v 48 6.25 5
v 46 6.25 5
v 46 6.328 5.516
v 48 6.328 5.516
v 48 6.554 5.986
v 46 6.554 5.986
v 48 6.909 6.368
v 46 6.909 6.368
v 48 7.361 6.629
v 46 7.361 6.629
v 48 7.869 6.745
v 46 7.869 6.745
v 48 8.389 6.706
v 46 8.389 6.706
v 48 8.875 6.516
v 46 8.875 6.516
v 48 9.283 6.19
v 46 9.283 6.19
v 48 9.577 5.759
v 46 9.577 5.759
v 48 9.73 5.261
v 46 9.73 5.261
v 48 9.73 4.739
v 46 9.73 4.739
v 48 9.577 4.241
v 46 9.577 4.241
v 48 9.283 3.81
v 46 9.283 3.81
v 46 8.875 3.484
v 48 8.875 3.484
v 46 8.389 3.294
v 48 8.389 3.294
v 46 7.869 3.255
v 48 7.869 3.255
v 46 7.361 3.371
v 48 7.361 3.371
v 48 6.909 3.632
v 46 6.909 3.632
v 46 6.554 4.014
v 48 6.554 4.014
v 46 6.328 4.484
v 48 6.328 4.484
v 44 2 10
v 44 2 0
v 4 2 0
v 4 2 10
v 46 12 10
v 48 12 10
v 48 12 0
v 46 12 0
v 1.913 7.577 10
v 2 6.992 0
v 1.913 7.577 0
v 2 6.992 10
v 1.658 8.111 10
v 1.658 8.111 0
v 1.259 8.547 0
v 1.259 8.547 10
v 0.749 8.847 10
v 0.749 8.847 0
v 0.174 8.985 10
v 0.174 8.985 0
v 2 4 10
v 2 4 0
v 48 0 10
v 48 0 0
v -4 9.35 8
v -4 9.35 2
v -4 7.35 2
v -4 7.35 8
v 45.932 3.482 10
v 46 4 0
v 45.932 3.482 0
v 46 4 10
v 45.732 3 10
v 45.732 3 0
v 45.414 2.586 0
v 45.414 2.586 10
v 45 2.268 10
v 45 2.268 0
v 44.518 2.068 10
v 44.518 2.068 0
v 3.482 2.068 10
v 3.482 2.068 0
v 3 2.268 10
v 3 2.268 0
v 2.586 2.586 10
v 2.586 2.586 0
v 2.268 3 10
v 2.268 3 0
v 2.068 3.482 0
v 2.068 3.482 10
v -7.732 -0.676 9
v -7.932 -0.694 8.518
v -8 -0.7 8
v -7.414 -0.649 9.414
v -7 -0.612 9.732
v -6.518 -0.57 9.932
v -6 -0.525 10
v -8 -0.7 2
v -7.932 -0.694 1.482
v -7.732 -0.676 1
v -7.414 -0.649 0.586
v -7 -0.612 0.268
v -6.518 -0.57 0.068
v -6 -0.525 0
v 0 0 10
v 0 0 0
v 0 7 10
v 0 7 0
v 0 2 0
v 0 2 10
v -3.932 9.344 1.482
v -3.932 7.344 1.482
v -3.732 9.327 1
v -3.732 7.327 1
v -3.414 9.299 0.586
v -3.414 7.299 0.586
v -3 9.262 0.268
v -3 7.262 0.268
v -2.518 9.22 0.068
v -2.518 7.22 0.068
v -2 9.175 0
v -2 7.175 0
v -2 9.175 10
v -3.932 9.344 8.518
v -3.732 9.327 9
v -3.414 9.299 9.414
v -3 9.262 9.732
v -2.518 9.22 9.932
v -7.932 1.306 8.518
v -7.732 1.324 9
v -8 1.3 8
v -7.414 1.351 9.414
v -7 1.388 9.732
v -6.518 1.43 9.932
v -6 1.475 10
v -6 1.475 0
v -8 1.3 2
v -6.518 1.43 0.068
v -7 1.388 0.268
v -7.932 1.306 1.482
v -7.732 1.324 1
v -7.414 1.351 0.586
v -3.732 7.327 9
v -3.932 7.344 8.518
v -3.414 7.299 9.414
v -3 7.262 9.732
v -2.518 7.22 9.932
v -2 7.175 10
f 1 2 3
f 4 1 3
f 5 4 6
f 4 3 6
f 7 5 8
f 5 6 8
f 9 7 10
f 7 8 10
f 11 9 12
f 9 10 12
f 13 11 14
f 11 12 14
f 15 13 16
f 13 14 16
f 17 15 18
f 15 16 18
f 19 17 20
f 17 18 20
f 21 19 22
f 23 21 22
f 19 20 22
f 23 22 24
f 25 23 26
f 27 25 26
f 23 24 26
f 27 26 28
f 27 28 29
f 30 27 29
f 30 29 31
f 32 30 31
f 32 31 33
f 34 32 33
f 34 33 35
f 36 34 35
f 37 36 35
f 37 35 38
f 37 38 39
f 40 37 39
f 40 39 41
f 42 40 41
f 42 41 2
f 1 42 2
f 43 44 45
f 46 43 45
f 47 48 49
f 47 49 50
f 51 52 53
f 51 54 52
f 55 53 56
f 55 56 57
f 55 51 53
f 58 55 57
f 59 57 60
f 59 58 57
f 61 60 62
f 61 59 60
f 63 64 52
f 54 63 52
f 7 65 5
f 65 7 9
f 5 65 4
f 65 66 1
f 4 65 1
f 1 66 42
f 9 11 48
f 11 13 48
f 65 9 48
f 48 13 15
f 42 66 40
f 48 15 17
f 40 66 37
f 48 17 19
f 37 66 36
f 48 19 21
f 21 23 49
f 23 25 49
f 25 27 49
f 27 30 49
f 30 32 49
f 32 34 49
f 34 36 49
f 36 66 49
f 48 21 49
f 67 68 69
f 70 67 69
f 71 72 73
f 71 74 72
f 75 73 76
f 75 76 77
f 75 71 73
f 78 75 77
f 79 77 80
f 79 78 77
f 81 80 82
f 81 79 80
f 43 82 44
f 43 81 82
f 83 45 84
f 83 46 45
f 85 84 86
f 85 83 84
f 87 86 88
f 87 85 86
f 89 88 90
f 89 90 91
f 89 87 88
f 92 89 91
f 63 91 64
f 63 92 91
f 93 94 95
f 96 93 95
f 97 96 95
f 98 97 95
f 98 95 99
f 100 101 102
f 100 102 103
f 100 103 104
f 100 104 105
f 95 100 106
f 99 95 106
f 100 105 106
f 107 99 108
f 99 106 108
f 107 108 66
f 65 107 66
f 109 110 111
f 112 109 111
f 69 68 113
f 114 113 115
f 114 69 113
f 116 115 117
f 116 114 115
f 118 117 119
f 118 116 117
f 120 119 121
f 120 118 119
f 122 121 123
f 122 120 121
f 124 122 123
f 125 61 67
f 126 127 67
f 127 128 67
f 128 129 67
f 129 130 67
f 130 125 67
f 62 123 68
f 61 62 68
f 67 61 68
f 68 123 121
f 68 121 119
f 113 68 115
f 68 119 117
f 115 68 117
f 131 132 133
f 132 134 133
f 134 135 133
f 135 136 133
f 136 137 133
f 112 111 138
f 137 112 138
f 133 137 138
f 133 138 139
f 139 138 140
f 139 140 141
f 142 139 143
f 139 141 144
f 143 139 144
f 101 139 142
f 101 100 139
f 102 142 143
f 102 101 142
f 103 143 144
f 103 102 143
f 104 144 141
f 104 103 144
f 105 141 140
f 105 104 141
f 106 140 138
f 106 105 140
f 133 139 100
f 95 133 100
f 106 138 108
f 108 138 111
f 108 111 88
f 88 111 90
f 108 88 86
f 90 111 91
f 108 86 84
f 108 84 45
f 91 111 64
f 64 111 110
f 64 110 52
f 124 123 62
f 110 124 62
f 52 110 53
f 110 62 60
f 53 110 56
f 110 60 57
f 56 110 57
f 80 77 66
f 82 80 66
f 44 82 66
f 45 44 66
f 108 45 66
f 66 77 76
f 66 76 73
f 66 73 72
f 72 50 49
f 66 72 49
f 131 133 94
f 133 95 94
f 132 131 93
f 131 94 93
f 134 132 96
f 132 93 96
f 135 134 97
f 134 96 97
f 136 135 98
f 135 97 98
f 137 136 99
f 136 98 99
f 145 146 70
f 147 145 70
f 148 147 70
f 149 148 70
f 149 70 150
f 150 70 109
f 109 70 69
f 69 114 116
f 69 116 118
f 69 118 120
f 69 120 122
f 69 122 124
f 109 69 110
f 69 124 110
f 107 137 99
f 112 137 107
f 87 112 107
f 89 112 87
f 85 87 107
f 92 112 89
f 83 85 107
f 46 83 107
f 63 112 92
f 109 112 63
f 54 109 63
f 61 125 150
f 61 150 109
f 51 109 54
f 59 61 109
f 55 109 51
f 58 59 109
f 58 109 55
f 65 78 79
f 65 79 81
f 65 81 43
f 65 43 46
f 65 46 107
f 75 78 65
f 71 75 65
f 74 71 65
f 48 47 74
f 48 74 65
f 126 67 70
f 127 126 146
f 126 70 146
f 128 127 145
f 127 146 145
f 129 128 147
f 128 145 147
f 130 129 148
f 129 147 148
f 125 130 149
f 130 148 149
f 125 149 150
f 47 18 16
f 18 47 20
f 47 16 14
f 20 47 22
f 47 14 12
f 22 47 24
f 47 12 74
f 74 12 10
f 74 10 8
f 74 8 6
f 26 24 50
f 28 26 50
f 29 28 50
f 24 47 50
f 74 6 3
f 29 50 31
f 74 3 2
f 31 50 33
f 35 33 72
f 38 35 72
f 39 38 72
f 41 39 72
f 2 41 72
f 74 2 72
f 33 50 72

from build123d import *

# Parameters (mm, degrees)
F1_DEPTH = 10
F2_R     = 2
F4_D     = 3.5
F4_DEPTH = 2.001


with BuildPart() as f1:
    # F0 (on Top) → F1 (new body)
    with BuildSketch(Plane.XY):
        Polygon((0, 0), (48, 0), (48, 12), (46, 12), (46, 2), (2, 2), (2, 8.8250226729), (-4, 9.3499546541), (-4, 7.3499546541), (0, 7), (0, 2), (-8, 1.3000906918), (-8, -0.6999093082), align=None)
    extrude(amount=F1_DEPTH)

    # F2
    f2_edges = [f1.edges().sort_by_distance(p)[0] for p in [
        (-8, 0.300091, 10),
        (-8, 0.300091, 0),
        (-4, 8.349955, 0),
        (-4, 8.349955, 10),
        (2, 2, 5),
        (2, 8.825023, 5),
        (46, 2, 5),
    ]]
    fillet(f2_edges, radius=F2_R)

    # F4 (through all, one way)
    with BuildSketch(Plane(origin=(46, 0, 0), x_dir=(0, -1, 0), z_dir=(-1, 0, 0))):
        with Locations((-8, 5)):
            Circle(F4_D / 2)
    extrude(amount=-F4_DEPTH, mode=Mode.SUBTRACT)


solid = f1.part
